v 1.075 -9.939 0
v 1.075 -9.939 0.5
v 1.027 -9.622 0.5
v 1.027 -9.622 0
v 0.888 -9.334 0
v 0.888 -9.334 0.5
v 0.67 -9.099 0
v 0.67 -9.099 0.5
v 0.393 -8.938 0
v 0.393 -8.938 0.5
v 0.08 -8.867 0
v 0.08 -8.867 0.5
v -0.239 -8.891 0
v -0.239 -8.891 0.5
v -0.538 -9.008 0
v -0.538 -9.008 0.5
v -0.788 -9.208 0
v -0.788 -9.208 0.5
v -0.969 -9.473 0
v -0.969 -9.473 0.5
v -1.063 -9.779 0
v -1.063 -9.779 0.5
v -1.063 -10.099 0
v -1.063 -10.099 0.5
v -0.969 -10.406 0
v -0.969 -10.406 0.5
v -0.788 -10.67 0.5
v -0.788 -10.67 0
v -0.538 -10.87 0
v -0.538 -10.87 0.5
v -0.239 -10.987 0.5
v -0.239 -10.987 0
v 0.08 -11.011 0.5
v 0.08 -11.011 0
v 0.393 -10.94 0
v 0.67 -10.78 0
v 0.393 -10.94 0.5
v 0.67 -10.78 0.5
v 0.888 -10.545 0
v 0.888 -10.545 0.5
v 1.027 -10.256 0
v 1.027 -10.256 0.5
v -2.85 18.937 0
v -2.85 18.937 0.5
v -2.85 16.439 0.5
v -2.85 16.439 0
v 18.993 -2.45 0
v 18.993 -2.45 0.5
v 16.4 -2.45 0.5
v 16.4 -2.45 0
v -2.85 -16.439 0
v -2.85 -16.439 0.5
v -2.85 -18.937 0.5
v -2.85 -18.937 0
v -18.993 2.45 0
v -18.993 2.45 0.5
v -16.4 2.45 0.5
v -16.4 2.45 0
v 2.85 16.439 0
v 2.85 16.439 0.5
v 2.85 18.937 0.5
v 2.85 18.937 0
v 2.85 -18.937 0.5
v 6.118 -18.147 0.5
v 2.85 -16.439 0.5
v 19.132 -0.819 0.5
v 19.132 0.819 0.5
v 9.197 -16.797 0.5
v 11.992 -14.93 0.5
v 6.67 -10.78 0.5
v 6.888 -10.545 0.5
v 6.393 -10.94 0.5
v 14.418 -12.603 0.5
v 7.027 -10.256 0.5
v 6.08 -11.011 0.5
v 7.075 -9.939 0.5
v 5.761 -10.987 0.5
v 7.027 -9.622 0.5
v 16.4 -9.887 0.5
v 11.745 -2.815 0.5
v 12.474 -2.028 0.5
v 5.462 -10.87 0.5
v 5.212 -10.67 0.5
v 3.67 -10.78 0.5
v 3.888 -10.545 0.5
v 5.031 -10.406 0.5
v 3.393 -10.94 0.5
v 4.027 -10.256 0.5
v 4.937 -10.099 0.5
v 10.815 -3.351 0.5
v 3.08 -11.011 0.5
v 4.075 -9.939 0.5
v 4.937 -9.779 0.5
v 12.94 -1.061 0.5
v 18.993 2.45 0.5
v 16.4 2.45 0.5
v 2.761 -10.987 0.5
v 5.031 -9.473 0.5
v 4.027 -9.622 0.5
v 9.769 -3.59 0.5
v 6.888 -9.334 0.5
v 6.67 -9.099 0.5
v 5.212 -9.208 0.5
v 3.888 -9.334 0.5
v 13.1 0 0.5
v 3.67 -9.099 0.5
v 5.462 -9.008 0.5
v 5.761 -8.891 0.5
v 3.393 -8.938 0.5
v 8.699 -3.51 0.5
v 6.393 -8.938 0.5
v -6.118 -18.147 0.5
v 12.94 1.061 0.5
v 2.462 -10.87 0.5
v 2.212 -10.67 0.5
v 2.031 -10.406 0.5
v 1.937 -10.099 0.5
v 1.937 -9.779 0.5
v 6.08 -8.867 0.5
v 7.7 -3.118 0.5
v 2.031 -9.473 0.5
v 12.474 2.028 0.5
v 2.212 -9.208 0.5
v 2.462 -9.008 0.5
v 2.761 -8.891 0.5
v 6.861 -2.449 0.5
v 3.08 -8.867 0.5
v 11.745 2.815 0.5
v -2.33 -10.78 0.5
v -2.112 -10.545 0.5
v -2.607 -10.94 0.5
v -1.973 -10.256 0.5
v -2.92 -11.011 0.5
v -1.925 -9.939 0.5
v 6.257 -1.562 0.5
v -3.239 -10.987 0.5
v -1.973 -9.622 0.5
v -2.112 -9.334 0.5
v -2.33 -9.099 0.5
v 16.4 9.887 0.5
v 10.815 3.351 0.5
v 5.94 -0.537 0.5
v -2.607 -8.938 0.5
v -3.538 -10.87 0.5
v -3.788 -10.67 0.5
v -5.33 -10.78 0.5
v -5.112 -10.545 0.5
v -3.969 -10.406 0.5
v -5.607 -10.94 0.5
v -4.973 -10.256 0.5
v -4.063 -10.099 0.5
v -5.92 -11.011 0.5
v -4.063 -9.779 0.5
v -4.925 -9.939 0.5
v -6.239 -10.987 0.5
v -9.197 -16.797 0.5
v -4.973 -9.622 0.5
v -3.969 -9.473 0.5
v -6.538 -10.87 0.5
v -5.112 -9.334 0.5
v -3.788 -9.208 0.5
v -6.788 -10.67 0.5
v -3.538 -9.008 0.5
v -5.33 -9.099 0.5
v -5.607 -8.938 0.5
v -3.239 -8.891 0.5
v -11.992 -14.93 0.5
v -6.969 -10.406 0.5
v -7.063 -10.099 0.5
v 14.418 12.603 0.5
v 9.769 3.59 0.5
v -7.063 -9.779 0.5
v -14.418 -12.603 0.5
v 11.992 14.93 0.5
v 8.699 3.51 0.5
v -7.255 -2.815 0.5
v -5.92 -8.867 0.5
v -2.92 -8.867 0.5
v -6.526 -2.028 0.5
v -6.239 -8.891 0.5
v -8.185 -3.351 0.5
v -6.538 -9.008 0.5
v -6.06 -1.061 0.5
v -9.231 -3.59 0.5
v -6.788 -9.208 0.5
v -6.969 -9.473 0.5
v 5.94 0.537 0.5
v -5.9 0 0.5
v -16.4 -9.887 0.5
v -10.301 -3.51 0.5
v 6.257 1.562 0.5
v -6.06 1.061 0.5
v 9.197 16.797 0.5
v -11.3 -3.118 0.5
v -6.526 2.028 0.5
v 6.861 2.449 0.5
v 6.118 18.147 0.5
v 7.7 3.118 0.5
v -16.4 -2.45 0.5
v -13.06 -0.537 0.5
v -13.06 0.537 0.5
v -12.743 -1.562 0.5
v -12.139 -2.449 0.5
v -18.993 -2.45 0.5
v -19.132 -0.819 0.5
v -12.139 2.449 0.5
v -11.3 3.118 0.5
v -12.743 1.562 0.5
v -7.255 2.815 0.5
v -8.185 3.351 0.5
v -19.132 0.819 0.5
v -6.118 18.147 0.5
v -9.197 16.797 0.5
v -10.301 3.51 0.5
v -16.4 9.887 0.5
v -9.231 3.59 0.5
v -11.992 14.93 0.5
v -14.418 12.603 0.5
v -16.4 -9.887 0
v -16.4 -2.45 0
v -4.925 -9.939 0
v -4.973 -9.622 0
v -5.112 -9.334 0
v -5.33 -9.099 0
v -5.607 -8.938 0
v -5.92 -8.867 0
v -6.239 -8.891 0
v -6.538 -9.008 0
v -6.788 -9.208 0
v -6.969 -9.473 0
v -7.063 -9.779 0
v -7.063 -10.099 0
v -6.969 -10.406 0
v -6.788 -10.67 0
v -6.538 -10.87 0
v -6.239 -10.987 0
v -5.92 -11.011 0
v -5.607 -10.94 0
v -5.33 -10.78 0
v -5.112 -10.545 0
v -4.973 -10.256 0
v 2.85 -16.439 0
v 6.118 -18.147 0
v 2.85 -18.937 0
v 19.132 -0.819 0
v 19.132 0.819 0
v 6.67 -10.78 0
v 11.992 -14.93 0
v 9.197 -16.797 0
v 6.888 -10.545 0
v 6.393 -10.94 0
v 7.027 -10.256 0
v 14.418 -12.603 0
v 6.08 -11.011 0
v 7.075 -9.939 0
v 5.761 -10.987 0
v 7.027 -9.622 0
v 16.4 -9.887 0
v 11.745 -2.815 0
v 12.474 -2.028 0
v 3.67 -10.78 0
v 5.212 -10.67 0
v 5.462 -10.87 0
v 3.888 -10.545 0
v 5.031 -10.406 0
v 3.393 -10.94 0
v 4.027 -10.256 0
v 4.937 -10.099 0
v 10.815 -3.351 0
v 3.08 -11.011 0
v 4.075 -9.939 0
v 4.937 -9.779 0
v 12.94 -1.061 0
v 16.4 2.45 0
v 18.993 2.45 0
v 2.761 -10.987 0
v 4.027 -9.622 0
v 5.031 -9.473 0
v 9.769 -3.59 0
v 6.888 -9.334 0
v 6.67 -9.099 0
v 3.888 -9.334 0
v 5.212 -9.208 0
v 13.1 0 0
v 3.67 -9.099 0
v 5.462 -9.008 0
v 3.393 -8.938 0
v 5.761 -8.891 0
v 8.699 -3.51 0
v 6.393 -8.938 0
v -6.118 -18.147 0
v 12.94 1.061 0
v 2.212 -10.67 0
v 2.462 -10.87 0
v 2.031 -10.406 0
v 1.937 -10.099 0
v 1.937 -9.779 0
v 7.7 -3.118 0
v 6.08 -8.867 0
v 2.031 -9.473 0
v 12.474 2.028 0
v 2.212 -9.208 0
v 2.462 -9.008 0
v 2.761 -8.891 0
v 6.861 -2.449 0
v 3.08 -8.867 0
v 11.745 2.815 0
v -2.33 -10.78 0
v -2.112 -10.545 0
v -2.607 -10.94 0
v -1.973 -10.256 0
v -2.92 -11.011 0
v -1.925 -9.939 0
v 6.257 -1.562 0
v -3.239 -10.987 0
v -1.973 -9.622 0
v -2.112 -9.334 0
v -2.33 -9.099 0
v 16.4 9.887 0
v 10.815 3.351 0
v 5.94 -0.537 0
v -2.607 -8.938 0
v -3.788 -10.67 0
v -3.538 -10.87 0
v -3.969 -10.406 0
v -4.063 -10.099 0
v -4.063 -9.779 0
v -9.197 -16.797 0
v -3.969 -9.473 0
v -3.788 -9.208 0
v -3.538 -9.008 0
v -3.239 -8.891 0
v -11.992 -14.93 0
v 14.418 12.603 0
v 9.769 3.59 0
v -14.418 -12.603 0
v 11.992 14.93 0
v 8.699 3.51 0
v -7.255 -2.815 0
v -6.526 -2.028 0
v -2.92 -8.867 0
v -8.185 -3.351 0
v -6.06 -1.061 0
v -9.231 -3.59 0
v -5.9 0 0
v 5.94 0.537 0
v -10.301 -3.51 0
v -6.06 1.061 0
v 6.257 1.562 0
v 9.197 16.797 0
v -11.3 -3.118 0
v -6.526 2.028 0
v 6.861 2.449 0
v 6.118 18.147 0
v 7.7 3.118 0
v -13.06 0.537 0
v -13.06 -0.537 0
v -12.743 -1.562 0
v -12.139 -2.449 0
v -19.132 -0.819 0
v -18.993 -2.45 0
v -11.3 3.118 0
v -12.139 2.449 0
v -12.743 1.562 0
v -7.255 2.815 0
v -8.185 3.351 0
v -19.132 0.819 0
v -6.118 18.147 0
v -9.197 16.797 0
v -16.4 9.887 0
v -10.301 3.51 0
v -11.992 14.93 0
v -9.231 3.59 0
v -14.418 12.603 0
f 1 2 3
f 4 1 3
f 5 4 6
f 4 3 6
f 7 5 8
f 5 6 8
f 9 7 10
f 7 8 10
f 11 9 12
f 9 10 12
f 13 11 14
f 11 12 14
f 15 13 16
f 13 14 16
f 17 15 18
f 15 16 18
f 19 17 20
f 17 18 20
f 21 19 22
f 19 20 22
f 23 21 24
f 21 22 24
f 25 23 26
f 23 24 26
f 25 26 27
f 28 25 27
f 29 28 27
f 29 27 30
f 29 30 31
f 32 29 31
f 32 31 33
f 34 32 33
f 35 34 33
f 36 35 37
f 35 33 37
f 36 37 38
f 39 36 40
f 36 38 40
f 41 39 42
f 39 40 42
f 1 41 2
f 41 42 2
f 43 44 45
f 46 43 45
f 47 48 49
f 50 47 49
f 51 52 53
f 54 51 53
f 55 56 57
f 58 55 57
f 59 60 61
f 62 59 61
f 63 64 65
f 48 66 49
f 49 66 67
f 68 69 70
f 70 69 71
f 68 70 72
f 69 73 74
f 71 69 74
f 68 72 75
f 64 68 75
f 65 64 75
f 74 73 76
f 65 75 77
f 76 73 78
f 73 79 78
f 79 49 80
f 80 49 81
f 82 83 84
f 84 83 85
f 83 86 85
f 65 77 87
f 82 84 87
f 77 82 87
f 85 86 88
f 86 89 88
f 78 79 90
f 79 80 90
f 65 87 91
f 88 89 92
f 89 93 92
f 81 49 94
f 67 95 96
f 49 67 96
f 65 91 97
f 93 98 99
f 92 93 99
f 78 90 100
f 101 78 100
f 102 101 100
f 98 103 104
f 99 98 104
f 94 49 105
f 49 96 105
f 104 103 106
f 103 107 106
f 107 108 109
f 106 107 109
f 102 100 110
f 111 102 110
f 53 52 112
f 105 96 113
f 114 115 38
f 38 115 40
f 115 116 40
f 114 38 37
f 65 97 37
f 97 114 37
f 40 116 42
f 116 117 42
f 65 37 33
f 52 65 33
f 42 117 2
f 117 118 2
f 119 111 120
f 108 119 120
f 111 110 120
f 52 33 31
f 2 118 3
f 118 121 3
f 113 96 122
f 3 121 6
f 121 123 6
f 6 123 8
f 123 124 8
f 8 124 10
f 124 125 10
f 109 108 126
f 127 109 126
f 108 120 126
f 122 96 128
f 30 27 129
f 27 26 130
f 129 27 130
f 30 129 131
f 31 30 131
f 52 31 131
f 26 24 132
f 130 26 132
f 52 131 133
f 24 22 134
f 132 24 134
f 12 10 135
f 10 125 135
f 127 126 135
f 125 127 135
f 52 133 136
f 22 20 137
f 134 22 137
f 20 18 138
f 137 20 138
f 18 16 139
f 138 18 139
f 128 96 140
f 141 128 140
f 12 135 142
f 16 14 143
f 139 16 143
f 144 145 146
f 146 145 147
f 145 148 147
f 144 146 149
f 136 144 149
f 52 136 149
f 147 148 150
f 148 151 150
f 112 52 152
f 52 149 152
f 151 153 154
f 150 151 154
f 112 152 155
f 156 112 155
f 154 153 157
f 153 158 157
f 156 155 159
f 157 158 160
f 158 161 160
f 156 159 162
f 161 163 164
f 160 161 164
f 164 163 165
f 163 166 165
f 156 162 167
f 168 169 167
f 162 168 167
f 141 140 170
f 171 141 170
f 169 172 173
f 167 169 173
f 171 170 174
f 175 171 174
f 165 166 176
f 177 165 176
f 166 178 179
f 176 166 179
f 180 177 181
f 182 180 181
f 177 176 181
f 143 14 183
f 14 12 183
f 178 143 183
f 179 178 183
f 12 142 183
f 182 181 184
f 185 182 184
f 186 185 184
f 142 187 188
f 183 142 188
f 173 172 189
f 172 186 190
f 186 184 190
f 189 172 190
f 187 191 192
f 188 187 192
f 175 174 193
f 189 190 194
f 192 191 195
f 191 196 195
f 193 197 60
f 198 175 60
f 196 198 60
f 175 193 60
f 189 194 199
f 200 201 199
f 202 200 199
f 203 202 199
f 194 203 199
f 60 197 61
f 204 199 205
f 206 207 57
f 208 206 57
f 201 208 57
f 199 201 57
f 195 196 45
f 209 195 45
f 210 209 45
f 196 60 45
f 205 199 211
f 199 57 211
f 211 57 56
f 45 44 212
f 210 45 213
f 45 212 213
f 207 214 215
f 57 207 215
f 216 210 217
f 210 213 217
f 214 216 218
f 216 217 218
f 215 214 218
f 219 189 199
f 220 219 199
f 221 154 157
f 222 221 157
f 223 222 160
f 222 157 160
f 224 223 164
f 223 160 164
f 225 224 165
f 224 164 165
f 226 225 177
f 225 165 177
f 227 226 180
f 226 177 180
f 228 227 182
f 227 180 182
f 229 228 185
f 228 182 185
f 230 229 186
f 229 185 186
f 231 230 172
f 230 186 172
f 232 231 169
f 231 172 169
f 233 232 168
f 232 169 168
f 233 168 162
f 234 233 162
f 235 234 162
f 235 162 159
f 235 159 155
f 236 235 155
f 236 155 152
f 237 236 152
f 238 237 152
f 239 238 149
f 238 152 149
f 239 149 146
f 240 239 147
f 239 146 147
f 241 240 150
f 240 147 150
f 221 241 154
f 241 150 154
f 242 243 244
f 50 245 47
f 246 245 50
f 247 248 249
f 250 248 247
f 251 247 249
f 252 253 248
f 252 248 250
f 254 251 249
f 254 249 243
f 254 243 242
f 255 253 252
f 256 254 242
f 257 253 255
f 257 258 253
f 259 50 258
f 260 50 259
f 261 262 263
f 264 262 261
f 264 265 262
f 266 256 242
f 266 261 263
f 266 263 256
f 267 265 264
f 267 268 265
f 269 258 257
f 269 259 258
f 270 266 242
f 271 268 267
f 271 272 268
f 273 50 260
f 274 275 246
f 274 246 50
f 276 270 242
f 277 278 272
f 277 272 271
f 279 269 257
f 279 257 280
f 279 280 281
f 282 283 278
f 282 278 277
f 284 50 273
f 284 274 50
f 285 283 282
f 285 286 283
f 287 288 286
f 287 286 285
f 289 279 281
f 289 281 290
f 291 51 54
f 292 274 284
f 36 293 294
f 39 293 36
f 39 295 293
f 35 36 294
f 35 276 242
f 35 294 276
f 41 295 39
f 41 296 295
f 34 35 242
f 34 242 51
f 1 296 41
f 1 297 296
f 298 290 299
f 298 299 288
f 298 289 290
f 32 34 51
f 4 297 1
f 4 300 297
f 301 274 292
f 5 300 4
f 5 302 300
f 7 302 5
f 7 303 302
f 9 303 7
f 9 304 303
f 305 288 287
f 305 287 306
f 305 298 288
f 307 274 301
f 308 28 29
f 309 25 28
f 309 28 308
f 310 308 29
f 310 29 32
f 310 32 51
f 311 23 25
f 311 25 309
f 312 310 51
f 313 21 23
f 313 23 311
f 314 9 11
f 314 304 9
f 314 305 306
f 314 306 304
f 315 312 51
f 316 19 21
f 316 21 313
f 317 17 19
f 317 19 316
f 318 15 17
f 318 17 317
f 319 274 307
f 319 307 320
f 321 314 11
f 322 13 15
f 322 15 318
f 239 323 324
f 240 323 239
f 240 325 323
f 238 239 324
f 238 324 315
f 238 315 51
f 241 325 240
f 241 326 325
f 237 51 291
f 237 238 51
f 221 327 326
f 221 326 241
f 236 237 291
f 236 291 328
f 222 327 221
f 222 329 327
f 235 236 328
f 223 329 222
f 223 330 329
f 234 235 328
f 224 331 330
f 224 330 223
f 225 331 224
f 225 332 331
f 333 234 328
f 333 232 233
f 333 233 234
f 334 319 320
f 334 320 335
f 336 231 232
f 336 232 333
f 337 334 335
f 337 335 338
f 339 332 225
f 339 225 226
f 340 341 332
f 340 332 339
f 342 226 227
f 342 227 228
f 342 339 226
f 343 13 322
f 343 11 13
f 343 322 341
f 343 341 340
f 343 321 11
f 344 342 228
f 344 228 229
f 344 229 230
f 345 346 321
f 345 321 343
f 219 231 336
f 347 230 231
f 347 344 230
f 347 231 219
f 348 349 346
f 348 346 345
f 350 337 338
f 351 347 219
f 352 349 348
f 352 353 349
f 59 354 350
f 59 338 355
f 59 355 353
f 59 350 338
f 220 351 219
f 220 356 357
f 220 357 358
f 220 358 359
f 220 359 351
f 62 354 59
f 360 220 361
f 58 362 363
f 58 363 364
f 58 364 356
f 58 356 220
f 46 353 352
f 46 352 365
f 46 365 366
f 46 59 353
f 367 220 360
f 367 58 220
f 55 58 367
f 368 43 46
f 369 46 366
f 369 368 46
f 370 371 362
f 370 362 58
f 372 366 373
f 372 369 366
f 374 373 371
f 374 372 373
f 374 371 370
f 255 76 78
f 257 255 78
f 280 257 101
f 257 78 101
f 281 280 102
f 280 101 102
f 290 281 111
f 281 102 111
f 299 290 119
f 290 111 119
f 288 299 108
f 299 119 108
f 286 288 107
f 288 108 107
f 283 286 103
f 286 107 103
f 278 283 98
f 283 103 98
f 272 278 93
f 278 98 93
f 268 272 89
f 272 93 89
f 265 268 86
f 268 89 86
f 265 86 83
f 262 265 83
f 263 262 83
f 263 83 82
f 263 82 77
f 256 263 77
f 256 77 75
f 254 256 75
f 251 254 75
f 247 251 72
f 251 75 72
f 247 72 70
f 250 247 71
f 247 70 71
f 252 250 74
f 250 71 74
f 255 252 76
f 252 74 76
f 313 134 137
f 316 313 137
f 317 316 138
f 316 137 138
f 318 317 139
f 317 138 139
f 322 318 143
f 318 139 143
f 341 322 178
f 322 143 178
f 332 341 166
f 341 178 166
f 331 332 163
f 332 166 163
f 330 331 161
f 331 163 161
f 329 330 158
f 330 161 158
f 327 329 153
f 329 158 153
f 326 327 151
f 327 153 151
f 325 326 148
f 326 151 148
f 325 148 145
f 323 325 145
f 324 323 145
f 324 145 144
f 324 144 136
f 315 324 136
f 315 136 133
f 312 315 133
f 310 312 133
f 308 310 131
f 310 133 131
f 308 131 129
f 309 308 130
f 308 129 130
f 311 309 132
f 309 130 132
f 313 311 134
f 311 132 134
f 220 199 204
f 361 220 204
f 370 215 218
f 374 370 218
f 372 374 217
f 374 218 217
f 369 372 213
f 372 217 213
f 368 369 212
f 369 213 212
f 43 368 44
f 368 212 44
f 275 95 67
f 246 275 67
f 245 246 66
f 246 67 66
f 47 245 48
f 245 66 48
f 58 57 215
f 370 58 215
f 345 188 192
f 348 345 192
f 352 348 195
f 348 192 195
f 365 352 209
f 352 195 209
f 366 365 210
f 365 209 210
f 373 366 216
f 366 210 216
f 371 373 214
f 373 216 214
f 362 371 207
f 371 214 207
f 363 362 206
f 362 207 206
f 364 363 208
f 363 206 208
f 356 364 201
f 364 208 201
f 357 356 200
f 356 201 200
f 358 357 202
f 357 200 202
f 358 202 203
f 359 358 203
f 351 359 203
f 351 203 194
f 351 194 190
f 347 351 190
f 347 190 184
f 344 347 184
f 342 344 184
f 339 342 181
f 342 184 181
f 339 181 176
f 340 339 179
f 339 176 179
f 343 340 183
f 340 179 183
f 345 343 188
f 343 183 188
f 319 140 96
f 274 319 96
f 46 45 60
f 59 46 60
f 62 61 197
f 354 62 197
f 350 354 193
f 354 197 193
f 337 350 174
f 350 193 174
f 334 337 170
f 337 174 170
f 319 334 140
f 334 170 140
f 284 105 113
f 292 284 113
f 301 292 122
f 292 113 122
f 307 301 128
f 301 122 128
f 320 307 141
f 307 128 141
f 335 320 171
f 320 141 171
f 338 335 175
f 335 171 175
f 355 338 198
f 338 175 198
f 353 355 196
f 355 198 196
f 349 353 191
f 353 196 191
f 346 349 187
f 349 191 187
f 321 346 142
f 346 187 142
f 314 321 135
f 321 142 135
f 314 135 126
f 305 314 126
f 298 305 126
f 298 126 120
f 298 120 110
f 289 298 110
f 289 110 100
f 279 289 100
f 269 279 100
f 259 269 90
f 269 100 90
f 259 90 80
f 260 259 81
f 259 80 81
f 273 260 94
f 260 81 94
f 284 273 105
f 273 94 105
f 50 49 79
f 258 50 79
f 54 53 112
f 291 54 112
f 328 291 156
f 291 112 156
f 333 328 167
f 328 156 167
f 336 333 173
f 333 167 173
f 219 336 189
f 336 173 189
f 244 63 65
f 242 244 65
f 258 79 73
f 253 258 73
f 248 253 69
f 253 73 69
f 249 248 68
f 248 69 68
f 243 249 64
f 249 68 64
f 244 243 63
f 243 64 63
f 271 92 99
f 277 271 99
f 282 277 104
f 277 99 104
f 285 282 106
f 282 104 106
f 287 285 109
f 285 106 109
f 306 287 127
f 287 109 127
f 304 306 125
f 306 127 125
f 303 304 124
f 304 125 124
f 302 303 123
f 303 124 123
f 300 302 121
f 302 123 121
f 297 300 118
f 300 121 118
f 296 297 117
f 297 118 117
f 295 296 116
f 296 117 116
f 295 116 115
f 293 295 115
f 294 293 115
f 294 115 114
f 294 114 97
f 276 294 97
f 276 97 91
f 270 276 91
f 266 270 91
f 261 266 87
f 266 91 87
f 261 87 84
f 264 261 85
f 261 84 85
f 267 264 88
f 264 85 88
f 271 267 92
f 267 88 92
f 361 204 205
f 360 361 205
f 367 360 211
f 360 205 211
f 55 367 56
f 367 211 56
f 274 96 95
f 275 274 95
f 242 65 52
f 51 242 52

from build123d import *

# Parameters (mm, degrees)
IZIM1_R                     = 3.25
IZIM1_R_2                   = 0.725
Y_KSEKLIK_EKSTR_ZYON3_DEPTH = 0.5
IZIM2_R                     = 1.075
IZIM2_R_2                   = 0.375
IZIM2_R_3                   = 3.6
IZIM2_R_4                   = 2.9
KES_EKSTR_ZYON_NCE1_DEPTH   = 0.5


with BuildPart() as part:
    # Çizim1 → Yükseklik-Ekstrüzyon3 (new body)
    with BuildSketch(Plane.XY):
        with BuildLine():
            Line((-19.29792735, 2.8), (-16.75, 2.8))
            Line((-16.75, 2.8), (-16.75, 9.984362774))
            ThreePointArc((-16.75, 9.984362774), (-10.701322664, 16.301278884), (-2.5, 19.339079606))
            Line((-2.5, 19.339079606), (-2.5, 16.789079606))
            Line((-2.5, 16.789079606), (2.5, 16.789079606))
            Line((2.5, 16.789079606), (2.5, 19.339079606))
            ThreePointArc((2.5, 19.339079606), (10.701322664, 16.301278884), (16.75, 9.984362774))
            Line((16.75, 9.984362774), (16.75, 2.8))
            Line((16.75, 2.8), (19.29792735, 2.8))
            ThreePointArc((19.29792735, 2.8), (19.5, 0), (19.29792735, -2.8))
            Line((19.29792735, -2.8), (16.75, -2.8))
            Line((16.75, -2.8), (16.75, -9.984362774))
            ThreePointArc((16.75, -9.984362774), (10.701322664, -16.301278884), (2.5, -19.339079606))
            Line((2.5, -19.339079606), (2.5, -16.789079606))
            Line((2.5, -16.789079606), (-2.5, -16.789079606))
            Line((-2.5, -16.789079606), (-2.5, -19.339079606))
            ThreePointArc((-2.5, -19.339079606), (-10.701322664, -16.301278884), (-16.75, -9.984362774))
            Line((-16.75, -9.984362774), (-16.75, -2.8))
            Line((-16.75, -2.8), (-19.29792735, -2.8))
            ThreePointArc((-19.29792735, -2.8), (-19.5, 0), (-19.29792735, 2.8))
        make_face()
        with Locations((9.5, 0)):
            Circle(IZIM1_R, mode=Mode.SUBTRACT)
        with Locations((0, -9.939079606)):
            Circle(IZIM1_R_2, mode=Mode.SUBTRACT)
        with Locations(Location((-9.5, 0, 0), (0, 0, 180))):
            Circle(IZIM1_R, mode=Mode.SUBTRACT)
        with Locations((3, -9.939079606)):
            Circle(IZIM1_R_2, mode=Mode.SUBTRACT)
        with Locations((6, -9.939079606)):
            Circle(IZIM1_R_2, mode=Mode.SUBTRACT)
        with Locations((-3, -9.939079606)):
            Circle(IZIM1_R_2, mode=Mode.SUBTRACT)
        with Locations((-6, -9.939079606)):
            Circle(IZIM1_R_2, mode=Mode.SUBTRACT)
    extrude(amount=Y_KSEKLIK_EKSTR_ZYON3_DEPTH)

    # Çizim2 → Kes-Ekstrüzyon-İnce1 (cut)
    with BuildSketch(Plane.XY.offset(0.5)):
        with BuildLine():
            Line((-17.1, -10.080302575), (-17.1, -3.15))
            Line((-17.1, -3.15), (-19.598469328, -3.15))
            ThreePointArc((-19.598469328, -3.15), (-19.85, 0), (-19.598469328, 3.15))
            Line((-19.598469328, 3.15), (-17.1, 3.15))
            Line((-17.1, 3.15), (-17.1, 10.080302575))
            ThreePointArc((-17.1, 10.080302575), (-10.767327068, 16.675945785), (-2.15, 19.73322072))
            Line((-2.15, 19.73322072), (-2.15, 17.139079606))
            Line((-2.15, 17.139079606), (2.15, 17.139079606))
            Line((2.15, 17.139079606), (2.15, 19.73322072))
            ThreePointArc((2.15, 19.73322072), (10.767327068, 16.675945785), (17.1, 10.080302575))
            Line((17.1, 10.080302575), (17.1, 3.15))
            Line((17.1, 3.15), (19.598469328, 3.15))
            ThreePointArc((19.598469328, 3.15), (19.85, 0), (19.598469328, -3.15))
            Line((19.598469328, -3.15), (17.1, -3.15))
            Line((17.1, -3.15), (17.1, -10.080302575))
            ThreePointArc((17.1, -10.080302575), (10.767327068, -16.675945785), (2.15, -19.73322072))
            Line((2.15, -19.73322072), (2.15, -17.139079606))
            Line((2.15, -17.139079606), (-2.15, -17.139079606))
            Line((-2.15, -17.139079606), (-2.15, -19.73322072))
            ThreePointArc((-2.15, -19.73322072), (-10.767327068, -16.675945785), (-17.1, -10.080302575))
        make_face()
        with BuildLine():
            Line((-16.4, -9.887492099), (-16.4, -2.45))
            Line((-16.4, -2.45), (-18.99263015, -2.45))
            ThreePointArc((-18.99263015, -2.45), (-19.15, 0), (-18.99263015, 2.45))
            Line((-18.99263015, 2.45), (-16.4, 2.45))
            Line((-16.4, 2.45), (-16.4, 9.887492099))
            ThreePointArc((-16.4, 9.887492099), (-10.635451675, 15.925126928), (-2.85, 18.936736783))
            Line((-2.85, 18.936736783), (-2.85, 16.439079606))
            Line((-2.85, 16.439079606), (2.85, 16.439079606))
            Line((2.85, 16.439079606), (2.85, 18.936736783))
            ThreePointArc((2.85, 18.936736783), (10.635451675, 15.925126928), (16.4, 9.887492099))
            Line((16.4, 9.887492099), (16.4, 2.45))
            Line((16.4, 2.45), (18.99263015, 2.45))
            ThreePointArc((18.99263015, 2.45), (19.15, 0), (18.99263015, -2.45))
            Line((18.99263015, -2.45), (16.4, -2.45))
            Line((16.4, -2.45), (16.4, -9.887492099))
            ThreePointArc((16.4, -9.887492099), (10.635451675, -15.925126928), (2.85, -18.936736783))
            Line((2.85, -18.936736783), (2.85, -16.439079606))
            Line((2.85, -16.439079606), (-2.85, -16.439079606))
            Line((-2.85, -16.439079606), (-2.85, -18.936736783))
            ThreePointArc((-2.85, -18.936736783), (-10.635451675, -15.925126928), (-16.4, -9.887492099))
        make_face(mode=Mode.SUBTRACT)
        with Locations((-6, -9.939079606)):
            Circle(IZIM2_R)
        with Locations((-6, -9.939079606)):
            Circle(IZIM2_R_2, mode=Mode.SUBTRACT)
        with Locations((-3, -9.939079606)):
            Circle(IZIM2_R)
        with Locations((-3, -9.939079606)):
            Circle(IZIM2_R_2, mode=Mode.SUBTRACT)
        with Locations((6, -9.939079606)):
            Circle(IZIM2_R)
        with Locations((6, -9.939079606)):
            Circle(IZIM2_R_2, mode=Mode.SUBTRACT)
        with Locations((3, -9.939079606)):
            Circle(IZIM2_R)
        with Locations((3, -9.939079606)):
            Circle(IZIM2_R_2, mode=Mode.SUBTRACT)
        with Locations((-9.5, 0)):
            Circle(IZIM2_R_3)
        with Locations((-9.5, 0)):
            Circle(IZIM2_R_4, mode=Mode.SUBTRACT)
        with Locations((0, -9.939079606)):
            Circle(IZIM2_R)
        with Locations((0, -9.939079606)):
            Circle(IZIM2_R_2, mode=Mode.SUBTRACT)
        with Locations((9.5, 0)):
            Circle(IZIM2_R_3)
        with Locations((9.5, 0)):
            Circle(IZIM2_R_4, mode=Mode.SUBTRACT)
    extrude(amount=-KES_EKSTR_ZYON_NCE1_DEPTH, mode=Mode.SUBTRACT)


solid = part.part
